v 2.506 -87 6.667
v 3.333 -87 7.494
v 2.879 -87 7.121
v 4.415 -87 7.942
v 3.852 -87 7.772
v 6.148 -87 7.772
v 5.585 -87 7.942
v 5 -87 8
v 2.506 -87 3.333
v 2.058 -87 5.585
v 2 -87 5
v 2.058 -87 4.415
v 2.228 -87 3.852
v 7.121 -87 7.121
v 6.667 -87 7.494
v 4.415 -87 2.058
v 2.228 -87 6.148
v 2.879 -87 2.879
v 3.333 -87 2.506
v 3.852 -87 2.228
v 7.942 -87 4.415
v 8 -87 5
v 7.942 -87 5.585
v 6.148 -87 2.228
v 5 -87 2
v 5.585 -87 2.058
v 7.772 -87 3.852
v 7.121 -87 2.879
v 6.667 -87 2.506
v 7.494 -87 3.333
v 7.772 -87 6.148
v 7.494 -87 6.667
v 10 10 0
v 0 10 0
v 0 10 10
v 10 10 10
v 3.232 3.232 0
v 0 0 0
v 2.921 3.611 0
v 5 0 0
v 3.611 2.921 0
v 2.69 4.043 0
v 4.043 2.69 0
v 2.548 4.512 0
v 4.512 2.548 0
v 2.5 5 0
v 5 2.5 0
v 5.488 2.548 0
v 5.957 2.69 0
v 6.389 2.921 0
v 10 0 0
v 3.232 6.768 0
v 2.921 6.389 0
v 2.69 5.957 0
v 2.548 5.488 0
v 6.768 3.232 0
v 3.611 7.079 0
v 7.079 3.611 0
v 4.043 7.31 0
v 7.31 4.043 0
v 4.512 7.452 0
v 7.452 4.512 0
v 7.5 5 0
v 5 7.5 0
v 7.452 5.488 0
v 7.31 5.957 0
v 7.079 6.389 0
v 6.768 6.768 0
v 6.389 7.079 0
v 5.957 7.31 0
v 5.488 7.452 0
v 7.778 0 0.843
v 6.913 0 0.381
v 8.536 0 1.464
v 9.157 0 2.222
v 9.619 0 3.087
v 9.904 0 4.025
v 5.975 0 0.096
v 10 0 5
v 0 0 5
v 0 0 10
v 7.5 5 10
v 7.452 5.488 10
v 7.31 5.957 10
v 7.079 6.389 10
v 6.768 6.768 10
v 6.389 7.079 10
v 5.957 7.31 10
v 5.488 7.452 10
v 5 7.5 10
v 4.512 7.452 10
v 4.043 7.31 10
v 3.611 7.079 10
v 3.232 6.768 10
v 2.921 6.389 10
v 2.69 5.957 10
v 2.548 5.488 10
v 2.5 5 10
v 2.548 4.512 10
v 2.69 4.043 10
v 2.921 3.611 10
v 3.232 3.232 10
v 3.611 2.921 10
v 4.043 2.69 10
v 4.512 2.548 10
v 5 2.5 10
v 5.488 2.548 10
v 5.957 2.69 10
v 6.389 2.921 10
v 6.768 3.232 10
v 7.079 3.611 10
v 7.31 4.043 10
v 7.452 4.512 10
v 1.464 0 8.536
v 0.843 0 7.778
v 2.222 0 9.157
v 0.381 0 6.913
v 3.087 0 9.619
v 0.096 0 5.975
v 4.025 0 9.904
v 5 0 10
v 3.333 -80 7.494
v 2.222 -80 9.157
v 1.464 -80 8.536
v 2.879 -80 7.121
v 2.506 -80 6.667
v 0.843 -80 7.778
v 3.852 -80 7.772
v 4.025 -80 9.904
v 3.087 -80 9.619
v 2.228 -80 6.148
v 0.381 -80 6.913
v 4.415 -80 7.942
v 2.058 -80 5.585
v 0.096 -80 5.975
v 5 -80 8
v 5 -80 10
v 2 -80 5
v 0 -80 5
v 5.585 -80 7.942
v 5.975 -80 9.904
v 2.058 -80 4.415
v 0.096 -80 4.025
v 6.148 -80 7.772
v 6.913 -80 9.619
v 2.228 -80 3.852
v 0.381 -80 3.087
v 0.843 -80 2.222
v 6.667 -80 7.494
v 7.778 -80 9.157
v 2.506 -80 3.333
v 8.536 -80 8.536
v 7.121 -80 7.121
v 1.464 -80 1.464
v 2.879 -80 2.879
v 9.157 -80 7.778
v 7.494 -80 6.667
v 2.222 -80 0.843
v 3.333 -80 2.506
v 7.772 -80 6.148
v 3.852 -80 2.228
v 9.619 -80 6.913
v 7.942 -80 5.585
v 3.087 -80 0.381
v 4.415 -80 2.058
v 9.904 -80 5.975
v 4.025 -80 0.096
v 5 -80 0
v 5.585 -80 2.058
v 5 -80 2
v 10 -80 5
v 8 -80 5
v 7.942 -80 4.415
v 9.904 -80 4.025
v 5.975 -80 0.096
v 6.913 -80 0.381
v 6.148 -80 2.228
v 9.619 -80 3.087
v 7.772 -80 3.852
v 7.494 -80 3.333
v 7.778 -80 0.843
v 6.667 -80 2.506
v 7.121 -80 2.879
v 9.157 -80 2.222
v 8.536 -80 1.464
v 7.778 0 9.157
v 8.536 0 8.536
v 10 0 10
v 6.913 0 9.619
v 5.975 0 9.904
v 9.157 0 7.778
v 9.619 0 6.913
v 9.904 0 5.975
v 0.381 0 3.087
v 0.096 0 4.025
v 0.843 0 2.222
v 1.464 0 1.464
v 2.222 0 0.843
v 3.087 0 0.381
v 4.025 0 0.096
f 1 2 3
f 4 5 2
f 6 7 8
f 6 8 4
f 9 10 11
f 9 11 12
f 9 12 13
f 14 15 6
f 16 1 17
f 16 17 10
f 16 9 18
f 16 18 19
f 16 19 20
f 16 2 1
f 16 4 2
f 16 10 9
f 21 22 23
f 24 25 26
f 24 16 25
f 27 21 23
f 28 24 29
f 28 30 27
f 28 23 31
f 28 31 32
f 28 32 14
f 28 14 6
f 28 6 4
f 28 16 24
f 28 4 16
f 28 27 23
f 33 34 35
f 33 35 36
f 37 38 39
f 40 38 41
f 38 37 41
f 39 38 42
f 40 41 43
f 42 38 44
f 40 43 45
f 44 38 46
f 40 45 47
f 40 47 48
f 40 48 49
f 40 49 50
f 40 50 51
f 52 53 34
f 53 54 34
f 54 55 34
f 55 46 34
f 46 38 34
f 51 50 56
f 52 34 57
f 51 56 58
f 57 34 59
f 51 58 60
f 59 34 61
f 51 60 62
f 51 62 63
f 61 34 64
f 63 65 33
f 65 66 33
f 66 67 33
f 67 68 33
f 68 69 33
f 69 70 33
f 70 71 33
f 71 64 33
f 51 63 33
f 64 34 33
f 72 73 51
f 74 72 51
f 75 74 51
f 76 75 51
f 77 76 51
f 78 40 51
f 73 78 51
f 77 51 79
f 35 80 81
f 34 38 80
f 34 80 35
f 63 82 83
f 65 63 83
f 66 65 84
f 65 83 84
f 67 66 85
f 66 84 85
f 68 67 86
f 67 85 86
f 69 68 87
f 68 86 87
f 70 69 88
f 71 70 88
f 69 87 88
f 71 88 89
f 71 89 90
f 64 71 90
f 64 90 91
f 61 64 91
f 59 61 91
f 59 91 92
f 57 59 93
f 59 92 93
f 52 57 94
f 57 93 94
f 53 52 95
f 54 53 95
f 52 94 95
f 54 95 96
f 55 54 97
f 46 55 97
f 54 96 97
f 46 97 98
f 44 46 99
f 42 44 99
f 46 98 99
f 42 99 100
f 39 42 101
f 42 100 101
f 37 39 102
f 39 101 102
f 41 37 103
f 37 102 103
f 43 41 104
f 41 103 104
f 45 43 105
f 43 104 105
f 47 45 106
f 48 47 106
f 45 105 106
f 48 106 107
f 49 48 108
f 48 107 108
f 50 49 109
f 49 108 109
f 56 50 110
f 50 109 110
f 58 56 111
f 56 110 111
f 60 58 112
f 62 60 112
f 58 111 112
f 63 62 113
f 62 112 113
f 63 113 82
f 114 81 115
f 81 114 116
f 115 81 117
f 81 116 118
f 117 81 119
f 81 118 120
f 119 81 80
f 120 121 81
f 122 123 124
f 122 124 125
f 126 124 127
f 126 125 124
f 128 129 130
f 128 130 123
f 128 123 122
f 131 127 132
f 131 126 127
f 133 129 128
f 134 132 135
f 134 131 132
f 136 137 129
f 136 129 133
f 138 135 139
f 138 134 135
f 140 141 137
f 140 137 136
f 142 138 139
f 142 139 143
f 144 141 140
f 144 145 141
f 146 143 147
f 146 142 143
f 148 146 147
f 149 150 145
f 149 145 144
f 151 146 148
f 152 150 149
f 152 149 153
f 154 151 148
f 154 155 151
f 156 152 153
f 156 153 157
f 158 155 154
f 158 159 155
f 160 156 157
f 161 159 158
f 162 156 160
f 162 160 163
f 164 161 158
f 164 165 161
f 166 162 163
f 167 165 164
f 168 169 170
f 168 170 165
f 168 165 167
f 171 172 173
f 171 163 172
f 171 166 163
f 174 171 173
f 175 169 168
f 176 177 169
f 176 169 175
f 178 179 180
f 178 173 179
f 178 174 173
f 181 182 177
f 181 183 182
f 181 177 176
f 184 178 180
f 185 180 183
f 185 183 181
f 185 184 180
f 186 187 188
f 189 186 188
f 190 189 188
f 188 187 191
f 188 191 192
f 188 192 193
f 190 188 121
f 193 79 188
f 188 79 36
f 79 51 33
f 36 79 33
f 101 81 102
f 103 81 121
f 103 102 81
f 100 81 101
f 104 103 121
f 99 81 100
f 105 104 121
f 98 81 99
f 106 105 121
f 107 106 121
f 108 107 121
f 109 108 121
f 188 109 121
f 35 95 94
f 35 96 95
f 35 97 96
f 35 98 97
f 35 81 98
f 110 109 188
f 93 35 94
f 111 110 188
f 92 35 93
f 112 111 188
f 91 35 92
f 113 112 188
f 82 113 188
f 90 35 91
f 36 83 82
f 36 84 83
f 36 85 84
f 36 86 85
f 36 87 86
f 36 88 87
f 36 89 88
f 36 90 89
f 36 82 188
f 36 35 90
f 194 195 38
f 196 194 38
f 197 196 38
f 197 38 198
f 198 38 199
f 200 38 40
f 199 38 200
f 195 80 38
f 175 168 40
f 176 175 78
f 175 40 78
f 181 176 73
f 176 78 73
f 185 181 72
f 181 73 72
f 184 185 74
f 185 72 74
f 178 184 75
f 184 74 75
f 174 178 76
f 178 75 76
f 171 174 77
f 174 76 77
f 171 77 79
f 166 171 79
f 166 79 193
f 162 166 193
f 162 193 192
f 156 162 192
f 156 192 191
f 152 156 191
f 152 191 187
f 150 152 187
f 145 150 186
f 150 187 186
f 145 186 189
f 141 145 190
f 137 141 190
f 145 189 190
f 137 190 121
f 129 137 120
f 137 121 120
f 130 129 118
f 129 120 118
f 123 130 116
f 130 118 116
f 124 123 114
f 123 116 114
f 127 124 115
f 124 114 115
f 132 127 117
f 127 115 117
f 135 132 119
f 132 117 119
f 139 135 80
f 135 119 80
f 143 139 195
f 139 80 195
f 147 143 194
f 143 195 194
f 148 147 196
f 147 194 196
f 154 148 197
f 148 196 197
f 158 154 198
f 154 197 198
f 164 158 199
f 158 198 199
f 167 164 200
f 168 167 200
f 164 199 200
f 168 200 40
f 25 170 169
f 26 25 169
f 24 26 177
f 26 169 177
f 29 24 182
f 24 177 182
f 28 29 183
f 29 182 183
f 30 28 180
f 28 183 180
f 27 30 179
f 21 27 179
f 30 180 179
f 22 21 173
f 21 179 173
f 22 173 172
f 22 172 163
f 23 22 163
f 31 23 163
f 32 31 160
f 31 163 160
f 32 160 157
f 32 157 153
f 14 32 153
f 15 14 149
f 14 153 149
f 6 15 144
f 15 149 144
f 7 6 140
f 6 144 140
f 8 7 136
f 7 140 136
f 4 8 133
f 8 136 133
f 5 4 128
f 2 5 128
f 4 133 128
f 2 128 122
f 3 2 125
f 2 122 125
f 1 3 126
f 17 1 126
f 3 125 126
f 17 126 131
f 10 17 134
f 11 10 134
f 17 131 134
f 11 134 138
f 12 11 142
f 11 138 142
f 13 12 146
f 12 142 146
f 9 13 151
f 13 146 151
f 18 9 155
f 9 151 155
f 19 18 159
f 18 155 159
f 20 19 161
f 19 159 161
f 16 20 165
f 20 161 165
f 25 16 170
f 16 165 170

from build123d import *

# Parameters (mm, degrees)
SKETCH2_W           = 10
SKETCH2_H           = 10
BOSS_EXTRUDE2_DEPTH = 10
SKETCH5_R           = 2.5
CUT_EXTRUDE1_DEPTH  = 10
SKETCH6_R           = 5
BOSS_EXTRUDE4_DEPTH = 80
SKETCH7_R           = 3
BOSS_EXTRUDE5_DEPTH = 7


with BuildPart() as part:
    # Sketch2 → Boss-Extrude2 (new body)
    with BuildSketch(Plane.XY):
        with Locations((5, 5)):
            Rectangle(SKETCH2_W, SKETCH2_H)
    extrude(amount=BOSS_EXTRUDE2_DEPTH)

    # Sketch5 → Cut-Extrude1 (cut)
    with BuildSketch(Plane.XY.offset(10)):
        with Locations((5, 5)):
            Circle(SKETCH5_R)
    extrude(amount=-CUT_EXTRUDE1_DEPTH, mode=Mode.SUBTRACT)

    # Sketch6 → Boss-Extrude4 (add)
    with BuildSketch(Plane.XZ):
        with Locations(Location((5, 5, 0), (0, 0, 270))):
            Circle(SKETCH6_R)
    extrude(amount=BOSS_EXTRUDE4_DEPTH)

    # Sketch7 → Boss-Extrude5 (add)
    with BuildSketch(Plane.XZ.offset(80)):
        with Locations(Location((5, 5, 0), (0, 0, 270))):
            Circle(SKETCH7_R)
    extrude(amount=BOSS_EXTRUDE5_DEPTH)


solid = part.part
